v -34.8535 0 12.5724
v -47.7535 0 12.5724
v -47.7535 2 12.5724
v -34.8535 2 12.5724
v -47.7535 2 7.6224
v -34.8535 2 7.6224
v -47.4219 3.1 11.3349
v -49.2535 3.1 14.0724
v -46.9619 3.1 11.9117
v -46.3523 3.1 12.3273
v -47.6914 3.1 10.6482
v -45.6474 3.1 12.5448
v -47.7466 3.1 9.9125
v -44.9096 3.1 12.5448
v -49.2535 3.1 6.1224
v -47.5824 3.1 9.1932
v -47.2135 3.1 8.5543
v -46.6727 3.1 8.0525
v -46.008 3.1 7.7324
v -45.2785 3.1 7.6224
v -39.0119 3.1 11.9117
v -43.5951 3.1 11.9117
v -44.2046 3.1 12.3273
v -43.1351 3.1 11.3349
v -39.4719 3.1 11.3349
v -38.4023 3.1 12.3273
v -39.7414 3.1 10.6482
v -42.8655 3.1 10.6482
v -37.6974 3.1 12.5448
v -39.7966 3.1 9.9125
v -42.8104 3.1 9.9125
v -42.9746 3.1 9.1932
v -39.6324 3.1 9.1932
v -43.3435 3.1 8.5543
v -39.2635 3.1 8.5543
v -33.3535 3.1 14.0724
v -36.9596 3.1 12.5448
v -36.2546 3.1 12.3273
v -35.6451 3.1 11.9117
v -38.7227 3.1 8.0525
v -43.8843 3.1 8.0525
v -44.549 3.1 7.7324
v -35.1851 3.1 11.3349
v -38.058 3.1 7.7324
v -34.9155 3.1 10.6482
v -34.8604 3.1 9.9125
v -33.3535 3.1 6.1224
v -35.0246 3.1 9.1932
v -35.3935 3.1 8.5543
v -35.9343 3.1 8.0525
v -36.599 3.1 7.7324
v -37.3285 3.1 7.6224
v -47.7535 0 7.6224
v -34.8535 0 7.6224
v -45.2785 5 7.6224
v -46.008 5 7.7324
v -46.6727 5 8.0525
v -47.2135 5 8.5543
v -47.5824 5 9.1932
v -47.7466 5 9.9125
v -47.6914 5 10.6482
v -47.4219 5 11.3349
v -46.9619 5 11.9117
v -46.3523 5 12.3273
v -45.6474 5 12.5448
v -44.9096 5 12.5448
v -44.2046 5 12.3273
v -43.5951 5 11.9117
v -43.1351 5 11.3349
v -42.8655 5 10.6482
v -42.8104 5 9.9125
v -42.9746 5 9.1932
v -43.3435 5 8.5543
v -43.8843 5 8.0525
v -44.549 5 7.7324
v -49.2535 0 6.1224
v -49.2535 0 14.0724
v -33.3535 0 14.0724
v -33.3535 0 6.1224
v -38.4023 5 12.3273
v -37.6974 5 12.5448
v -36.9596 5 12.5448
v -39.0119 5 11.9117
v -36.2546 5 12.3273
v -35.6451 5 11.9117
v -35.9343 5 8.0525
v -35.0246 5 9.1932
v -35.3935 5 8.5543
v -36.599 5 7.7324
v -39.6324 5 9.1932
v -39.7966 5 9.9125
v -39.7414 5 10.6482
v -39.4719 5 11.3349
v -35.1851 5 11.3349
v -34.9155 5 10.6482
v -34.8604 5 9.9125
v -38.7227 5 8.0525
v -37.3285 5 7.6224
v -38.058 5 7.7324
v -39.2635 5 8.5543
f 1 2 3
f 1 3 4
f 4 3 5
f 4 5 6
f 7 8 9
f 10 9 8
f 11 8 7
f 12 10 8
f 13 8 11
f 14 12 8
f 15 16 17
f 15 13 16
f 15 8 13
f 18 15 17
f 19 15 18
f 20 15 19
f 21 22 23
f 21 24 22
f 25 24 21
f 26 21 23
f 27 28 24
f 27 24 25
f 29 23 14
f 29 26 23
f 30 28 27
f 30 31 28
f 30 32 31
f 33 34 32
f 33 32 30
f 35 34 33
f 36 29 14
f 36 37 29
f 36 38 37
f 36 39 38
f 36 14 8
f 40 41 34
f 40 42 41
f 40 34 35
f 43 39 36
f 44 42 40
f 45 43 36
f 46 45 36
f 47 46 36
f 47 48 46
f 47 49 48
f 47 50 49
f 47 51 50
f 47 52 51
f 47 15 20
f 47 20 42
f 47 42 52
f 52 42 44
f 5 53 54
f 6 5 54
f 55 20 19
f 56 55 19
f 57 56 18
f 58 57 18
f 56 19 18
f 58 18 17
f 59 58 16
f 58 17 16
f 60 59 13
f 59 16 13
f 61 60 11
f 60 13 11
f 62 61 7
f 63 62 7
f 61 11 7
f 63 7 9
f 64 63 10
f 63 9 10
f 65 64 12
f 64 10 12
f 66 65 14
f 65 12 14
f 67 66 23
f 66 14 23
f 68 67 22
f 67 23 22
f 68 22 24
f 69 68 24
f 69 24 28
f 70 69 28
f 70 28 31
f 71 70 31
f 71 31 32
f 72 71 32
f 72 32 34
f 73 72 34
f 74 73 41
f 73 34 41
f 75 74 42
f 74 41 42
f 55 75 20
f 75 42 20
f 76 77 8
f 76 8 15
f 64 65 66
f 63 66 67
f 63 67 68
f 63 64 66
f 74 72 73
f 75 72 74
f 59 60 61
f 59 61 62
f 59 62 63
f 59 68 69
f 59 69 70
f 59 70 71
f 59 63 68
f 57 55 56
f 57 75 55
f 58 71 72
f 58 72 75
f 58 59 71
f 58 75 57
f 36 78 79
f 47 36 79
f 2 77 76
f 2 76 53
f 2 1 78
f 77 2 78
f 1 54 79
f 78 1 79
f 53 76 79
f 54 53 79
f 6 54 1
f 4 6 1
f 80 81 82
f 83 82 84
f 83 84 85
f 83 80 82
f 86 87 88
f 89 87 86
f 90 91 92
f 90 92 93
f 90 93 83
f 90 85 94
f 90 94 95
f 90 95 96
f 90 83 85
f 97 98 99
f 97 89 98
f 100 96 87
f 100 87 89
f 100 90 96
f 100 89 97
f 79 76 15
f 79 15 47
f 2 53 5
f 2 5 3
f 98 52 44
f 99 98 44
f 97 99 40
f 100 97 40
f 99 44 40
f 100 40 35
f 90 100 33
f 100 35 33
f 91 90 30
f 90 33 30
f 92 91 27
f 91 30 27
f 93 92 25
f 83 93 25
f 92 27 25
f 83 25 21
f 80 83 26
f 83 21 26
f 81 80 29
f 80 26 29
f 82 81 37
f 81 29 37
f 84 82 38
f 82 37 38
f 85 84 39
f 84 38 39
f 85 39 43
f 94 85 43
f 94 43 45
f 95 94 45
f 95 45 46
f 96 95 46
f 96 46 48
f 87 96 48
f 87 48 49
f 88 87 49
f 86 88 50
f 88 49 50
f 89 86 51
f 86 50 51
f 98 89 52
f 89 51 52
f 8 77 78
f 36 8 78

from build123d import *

# Parameters (mm, degrees)
SKETCH1_W           = 15.9
SKETCH1_H           = 7.95
BOSS_EXTRUDE1_DEPTH = 3.1
SKETCH2_R           = 2.475
BOSS_EXTRUDE2_DEPTH = 1.9
SKETCH3_W           = 12.9
SKETCH3_H           = 4.95
CUT_EXTRUDE1_DEPTH  = 2


with BuildPart() as part:
    # Sketch1 → Boss-Extrude1 (new body)
    with BuildSketch(Plane(origin=(0, 0, 0), x_dir=(1, 0, 0), z_dir=(0, 1, 0))):
        with Locations((-41.303484122, -10.097424035)):
            Rectangle(SKETCH1_W, SKETCH1_H)
    extrude(amount=BOSS_EXTRUDE1_DEPTH)

    # Sketch2 → Boss-Extrude2 (add)
    with BuildSketch(Plane(origin=(0, 3.1, 0), x_dir=(1, 0, 0), z_dir=(0, 1, 0))):
        with Locations(Location((-45.278484122, -10.097424035, 0), (0, 0, 90))):
            Circle(SKETCH2_R)
        with Locations(Location((-37.328484122, -10.097424035, 0), (0, 0, 90))):
            Circle(SKETCH2_R)
    extrude(amount=BOSS_EXTRUDE2_DEPTH)

    # Sketch3 → Cut-Extrude1 (cut)
    with BuildSketch(Plane.XZ):
        with Locations((-41.303484122, 10.097424035)):
            Rectangle(SKETCH3_W, SKETCH3_H)
    extrude(amount=-CUT_EXTRUDE1_DEPTH, mode=Mode.SUBTRACT)


solid = part.part
